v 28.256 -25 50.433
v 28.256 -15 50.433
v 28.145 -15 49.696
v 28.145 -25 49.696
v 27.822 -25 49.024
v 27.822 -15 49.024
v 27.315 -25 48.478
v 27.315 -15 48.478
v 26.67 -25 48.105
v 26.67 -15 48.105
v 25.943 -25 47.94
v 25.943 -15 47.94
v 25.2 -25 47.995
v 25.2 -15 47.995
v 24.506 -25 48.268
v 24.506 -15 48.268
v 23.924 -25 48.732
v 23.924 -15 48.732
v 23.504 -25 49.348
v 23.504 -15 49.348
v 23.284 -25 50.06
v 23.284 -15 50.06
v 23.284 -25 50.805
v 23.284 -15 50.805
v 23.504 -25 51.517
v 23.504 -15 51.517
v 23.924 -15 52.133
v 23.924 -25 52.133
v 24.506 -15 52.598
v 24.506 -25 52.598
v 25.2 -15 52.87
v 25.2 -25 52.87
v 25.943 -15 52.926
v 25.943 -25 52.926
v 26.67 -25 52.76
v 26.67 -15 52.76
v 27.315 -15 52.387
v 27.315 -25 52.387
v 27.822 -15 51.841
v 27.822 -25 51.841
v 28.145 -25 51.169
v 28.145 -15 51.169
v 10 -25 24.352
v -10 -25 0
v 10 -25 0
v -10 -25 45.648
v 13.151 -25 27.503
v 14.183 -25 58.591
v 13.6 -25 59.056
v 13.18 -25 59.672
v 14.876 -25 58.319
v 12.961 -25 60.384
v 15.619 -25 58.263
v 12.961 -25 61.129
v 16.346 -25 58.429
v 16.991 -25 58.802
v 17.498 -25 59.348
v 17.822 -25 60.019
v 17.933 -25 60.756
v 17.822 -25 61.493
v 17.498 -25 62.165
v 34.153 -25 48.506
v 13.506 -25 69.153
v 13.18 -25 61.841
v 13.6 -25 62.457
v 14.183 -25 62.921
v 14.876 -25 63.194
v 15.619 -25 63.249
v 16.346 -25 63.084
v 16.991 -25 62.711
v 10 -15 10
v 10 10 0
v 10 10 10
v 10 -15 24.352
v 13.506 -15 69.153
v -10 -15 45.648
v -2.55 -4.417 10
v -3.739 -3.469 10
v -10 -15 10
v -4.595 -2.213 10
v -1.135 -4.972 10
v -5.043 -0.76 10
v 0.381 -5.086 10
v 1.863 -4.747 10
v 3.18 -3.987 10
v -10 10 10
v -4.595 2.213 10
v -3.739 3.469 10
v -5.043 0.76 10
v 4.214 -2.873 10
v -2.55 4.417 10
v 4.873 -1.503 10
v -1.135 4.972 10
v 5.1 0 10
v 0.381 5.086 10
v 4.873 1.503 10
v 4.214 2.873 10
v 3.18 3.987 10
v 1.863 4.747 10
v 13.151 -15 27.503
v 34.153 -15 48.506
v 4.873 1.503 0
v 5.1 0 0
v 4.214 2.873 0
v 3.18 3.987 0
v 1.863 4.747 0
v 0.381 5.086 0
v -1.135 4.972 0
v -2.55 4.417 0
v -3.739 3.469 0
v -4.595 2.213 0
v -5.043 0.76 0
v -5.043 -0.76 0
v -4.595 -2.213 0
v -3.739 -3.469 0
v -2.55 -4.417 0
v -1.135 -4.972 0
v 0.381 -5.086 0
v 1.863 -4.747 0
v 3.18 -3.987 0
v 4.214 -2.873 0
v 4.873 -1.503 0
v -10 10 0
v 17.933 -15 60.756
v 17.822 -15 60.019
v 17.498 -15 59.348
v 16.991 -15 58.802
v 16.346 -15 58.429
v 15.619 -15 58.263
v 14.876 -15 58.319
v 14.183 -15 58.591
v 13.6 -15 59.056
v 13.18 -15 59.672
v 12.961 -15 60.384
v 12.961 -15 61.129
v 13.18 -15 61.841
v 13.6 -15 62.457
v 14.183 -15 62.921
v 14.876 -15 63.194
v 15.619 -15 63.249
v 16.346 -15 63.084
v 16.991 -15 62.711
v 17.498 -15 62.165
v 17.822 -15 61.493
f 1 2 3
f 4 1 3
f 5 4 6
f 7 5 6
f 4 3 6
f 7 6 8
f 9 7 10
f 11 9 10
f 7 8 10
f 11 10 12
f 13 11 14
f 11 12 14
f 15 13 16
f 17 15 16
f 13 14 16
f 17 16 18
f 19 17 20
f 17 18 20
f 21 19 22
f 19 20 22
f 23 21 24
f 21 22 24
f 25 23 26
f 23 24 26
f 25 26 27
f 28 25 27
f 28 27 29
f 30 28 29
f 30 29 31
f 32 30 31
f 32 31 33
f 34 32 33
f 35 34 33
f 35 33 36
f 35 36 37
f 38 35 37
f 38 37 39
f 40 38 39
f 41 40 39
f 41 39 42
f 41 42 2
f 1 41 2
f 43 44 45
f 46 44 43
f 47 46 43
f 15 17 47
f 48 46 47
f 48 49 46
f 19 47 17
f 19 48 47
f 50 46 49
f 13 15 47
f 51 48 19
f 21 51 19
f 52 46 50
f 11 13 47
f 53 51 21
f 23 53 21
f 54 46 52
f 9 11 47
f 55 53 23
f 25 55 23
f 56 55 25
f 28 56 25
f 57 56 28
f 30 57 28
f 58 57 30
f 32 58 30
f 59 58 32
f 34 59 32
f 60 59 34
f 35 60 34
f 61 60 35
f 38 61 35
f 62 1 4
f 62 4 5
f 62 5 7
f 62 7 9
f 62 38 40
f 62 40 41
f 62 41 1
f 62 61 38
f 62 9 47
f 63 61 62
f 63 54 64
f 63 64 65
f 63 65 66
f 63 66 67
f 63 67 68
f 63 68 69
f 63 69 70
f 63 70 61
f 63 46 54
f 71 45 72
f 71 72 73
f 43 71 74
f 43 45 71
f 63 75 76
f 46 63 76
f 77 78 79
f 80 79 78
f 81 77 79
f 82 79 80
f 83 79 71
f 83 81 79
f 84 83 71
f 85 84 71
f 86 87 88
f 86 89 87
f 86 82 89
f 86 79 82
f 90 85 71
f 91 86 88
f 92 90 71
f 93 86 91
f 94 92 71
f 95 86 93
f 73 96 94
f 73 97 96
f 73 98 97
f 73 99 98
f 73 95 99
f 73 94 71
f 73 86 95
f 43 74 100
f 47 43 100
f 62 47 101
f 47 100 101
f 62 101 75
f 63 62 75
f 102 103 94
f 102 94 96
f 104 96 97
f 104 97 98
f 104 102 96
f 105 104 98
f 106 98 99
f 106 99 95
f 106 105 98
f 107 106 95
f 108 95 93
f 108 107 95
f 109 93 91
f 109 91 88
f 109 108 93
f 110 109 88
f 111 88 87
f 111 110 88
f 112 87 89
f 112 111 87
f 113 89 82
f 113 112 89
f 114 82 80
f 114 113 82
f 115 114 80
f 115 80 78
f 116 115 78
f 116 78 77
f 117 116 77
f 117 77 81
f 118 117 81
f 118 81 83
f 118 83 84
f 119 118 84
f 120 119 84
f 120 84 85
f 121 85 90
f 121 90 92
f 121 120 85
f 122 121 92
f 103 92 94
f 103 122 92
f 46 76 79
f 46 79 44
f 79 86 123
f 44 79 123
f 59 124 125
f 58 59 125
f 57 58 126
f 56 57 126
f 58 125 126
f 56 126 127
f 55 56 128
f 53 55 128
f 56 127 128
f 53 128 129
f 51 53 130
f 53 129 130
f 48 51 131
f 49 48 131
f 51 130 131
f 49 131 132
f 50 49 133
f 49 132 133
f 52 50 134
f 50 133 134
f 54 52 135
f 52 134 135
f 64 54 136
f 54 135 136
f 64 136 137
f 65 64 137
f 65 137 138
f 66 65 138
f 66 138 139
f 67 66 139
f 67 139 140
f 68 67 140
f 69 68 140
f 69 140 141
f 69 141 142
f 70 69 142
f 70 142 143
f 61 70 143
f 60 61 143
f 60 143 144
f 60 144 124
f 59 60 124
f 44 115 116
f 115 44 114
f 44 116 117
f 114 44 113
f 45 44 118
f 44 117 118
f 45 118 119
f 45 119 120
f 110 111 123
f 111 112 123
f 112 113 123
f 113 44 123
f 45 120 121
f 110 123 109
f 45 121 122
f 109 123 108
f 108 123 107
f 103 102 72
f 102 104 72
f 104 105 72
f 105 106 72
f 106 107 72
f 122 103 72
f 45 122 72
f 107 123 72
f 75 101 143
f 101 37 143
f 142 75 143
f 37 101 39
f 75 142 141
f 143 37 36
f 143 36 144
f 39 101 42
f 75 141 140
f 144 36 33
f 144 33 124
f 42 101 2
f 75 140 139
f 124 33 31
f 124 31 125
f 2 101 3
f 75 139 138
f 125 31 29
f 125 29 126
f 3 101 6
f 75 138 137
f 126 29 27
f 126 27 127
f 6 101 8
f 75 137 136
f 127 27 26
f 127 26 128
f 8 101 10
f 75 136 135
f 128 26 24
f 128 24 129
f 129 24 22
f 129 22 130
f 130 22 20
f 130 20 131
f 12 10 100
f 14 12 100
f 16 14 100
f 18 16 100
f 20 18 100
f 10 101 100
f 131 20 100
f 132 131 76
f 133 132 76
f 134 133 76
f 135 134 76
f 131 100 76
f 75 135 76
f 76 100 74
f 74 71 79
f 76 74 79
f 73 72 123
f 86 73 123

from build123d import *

# Parameters (mm, degrees)
SKETCH1_R           = 5.1
BOSS_EXTRUDE1_DEPTH = 10
BOSS_EXTRUDE3_DEPTH = 10
BOSS_EXTRUDE4_DEPTH = 10
CUT_EXTRUDE1_REACH  = 12
SKETCH7_R           = 2.5
CUT_EXTRUDE4_REACH  = 37


with BuildPart() as part:
    # Sketch1 → Boss-Extrude1 (new body)
    with BuildSketch(Plane.XY):
        Polygon((-10, -10), (-10, -15), (10, -15), (10, -10), (10, 10), (-10, 10), align=None)
        Circle(SKETCH1_R, mode=Mode.SUBTRACT)
    extrude(amount=BOSS_EXTRUDE1_DEPTH)

    # Sketch4 → Boss-Extrude3 (add)
    with BuildSketch(Plane.XZ.offset(15)):
        Polygon((-10, 10), (-10, 0), (10, 0), (10, 10), (14.5, 35), (14.5, 40), (-14.5, 40), (-14.5, 35), align=None)
    extrude(amount=BOSS_EXTRUDE3_DEPTH)

    # Sketch6 → Boss-Extrude4 (add)
    with BuildSketch(Plane(origin=(0, -15, 0), x_dir=(1, 0, 0), z_dir=(0, 1, 0))):
        Polygon((0, -35), (10.323759005, -24.676240995), (34.153257531, -48.505739521), (13.505739521, -69.153257531), (-10.323759005, -45.323759005), (-14.5, -40), (-5, -40), align=None)
    extrude(amount=-BOSS_EXTRUDE4_DEPTH)

    # Sketch7 → Cut-Extrude1 (cut, up to next)
    with BuildSketch(Plane(origin=(0, -15, 0), x_dir=(1, 0, 0), z_dir=(0, 1, 0)), mode=Mode.PRIVATE) as cut_extrude1_sk1:
        with Locations((15.432605499, -60.756364505)):
            Circle(SKETCH7_R)
    cut_extrude1_tool1 = extrude(cut_extrude1_sk1.sketch, amount=-CUT_EXTRUDE1_REACH, mode=Mode.PRIVATE) & part.part
    add(cut_extrude1_tool1.solids().sort_by_distance((15.432605, -15, 60.756365))[0], mode=Mode.SUBTRACT)
    # Sketch7 → Cut-Extrude1 (cut, up to next)
    with BuildSketch(Plane(origin=(0, -15, 0), x_dir=(1, 0, 0), z_dir=(0, 1, 0)), mode=Mode.PRIVATE) as cut_extrude1_sk2:
        with Locations((25.756364505, -50.432605499)):
            Circle(SKETCH7_R)
    cut_extrude1_tool2 = extrude(cut_extrude1_sk2.sketch, amount=-CUT_EXTRUDE1_REACH, mode=Mode.PRIVATE) & part.part
    add(cut_extrude1_tool2.solids().sort_by_distance((25.756365, -15, 50.432605))[0], mode=Mode.SUBTRACT)

    # Sketch8 → Cut-Extrude4 (cut, up to next)
    with BuildSketch(Plane.XZ.offset(25), mode=Mode.PRIVATE) as cut_extrude4_sk1:
        Polygon((10, 10), (10, 24.352481989), (13.150544827, 27.503026816), align=None)
    cut_extrude4_tool1 = extrude(cut_extrude4_sk1.sketch, amount=-CUT_EXTRUDE4_REACH, mode=Mode.PRIVATE) & part.part
    add(cut_extrude4_tool1.solids().sort_by_distance((11.050182, -25, 20.618503))[0], mode=Mode.SUBTRACT)
    # Sketch8 → Cut-Extrude4 (cut, up to next)
    with BuildSketch(Plane.XZ.offset(25), mode=Mode.PRIVATE) as cut_extrude4_sk2:
        Polygon((-14.5, 40), (-14.5, 35), (-10, 10), (-10, 45.647518011), (-10.323759005, 45.323759005), align=None)
    cut_extrude4_tool2 = extrude(cut_extrude4_sk2.sketch, amount=-CUT_EXTRUDE4_REACH, mode=Mode.PRIVATE) & part.part
    add(cut_extrude4_tool2.solids().sort_by_distance((-11.684358, -25, 31.470679))[0], mode=Mode.SUBTRACT)


solid = part.part
